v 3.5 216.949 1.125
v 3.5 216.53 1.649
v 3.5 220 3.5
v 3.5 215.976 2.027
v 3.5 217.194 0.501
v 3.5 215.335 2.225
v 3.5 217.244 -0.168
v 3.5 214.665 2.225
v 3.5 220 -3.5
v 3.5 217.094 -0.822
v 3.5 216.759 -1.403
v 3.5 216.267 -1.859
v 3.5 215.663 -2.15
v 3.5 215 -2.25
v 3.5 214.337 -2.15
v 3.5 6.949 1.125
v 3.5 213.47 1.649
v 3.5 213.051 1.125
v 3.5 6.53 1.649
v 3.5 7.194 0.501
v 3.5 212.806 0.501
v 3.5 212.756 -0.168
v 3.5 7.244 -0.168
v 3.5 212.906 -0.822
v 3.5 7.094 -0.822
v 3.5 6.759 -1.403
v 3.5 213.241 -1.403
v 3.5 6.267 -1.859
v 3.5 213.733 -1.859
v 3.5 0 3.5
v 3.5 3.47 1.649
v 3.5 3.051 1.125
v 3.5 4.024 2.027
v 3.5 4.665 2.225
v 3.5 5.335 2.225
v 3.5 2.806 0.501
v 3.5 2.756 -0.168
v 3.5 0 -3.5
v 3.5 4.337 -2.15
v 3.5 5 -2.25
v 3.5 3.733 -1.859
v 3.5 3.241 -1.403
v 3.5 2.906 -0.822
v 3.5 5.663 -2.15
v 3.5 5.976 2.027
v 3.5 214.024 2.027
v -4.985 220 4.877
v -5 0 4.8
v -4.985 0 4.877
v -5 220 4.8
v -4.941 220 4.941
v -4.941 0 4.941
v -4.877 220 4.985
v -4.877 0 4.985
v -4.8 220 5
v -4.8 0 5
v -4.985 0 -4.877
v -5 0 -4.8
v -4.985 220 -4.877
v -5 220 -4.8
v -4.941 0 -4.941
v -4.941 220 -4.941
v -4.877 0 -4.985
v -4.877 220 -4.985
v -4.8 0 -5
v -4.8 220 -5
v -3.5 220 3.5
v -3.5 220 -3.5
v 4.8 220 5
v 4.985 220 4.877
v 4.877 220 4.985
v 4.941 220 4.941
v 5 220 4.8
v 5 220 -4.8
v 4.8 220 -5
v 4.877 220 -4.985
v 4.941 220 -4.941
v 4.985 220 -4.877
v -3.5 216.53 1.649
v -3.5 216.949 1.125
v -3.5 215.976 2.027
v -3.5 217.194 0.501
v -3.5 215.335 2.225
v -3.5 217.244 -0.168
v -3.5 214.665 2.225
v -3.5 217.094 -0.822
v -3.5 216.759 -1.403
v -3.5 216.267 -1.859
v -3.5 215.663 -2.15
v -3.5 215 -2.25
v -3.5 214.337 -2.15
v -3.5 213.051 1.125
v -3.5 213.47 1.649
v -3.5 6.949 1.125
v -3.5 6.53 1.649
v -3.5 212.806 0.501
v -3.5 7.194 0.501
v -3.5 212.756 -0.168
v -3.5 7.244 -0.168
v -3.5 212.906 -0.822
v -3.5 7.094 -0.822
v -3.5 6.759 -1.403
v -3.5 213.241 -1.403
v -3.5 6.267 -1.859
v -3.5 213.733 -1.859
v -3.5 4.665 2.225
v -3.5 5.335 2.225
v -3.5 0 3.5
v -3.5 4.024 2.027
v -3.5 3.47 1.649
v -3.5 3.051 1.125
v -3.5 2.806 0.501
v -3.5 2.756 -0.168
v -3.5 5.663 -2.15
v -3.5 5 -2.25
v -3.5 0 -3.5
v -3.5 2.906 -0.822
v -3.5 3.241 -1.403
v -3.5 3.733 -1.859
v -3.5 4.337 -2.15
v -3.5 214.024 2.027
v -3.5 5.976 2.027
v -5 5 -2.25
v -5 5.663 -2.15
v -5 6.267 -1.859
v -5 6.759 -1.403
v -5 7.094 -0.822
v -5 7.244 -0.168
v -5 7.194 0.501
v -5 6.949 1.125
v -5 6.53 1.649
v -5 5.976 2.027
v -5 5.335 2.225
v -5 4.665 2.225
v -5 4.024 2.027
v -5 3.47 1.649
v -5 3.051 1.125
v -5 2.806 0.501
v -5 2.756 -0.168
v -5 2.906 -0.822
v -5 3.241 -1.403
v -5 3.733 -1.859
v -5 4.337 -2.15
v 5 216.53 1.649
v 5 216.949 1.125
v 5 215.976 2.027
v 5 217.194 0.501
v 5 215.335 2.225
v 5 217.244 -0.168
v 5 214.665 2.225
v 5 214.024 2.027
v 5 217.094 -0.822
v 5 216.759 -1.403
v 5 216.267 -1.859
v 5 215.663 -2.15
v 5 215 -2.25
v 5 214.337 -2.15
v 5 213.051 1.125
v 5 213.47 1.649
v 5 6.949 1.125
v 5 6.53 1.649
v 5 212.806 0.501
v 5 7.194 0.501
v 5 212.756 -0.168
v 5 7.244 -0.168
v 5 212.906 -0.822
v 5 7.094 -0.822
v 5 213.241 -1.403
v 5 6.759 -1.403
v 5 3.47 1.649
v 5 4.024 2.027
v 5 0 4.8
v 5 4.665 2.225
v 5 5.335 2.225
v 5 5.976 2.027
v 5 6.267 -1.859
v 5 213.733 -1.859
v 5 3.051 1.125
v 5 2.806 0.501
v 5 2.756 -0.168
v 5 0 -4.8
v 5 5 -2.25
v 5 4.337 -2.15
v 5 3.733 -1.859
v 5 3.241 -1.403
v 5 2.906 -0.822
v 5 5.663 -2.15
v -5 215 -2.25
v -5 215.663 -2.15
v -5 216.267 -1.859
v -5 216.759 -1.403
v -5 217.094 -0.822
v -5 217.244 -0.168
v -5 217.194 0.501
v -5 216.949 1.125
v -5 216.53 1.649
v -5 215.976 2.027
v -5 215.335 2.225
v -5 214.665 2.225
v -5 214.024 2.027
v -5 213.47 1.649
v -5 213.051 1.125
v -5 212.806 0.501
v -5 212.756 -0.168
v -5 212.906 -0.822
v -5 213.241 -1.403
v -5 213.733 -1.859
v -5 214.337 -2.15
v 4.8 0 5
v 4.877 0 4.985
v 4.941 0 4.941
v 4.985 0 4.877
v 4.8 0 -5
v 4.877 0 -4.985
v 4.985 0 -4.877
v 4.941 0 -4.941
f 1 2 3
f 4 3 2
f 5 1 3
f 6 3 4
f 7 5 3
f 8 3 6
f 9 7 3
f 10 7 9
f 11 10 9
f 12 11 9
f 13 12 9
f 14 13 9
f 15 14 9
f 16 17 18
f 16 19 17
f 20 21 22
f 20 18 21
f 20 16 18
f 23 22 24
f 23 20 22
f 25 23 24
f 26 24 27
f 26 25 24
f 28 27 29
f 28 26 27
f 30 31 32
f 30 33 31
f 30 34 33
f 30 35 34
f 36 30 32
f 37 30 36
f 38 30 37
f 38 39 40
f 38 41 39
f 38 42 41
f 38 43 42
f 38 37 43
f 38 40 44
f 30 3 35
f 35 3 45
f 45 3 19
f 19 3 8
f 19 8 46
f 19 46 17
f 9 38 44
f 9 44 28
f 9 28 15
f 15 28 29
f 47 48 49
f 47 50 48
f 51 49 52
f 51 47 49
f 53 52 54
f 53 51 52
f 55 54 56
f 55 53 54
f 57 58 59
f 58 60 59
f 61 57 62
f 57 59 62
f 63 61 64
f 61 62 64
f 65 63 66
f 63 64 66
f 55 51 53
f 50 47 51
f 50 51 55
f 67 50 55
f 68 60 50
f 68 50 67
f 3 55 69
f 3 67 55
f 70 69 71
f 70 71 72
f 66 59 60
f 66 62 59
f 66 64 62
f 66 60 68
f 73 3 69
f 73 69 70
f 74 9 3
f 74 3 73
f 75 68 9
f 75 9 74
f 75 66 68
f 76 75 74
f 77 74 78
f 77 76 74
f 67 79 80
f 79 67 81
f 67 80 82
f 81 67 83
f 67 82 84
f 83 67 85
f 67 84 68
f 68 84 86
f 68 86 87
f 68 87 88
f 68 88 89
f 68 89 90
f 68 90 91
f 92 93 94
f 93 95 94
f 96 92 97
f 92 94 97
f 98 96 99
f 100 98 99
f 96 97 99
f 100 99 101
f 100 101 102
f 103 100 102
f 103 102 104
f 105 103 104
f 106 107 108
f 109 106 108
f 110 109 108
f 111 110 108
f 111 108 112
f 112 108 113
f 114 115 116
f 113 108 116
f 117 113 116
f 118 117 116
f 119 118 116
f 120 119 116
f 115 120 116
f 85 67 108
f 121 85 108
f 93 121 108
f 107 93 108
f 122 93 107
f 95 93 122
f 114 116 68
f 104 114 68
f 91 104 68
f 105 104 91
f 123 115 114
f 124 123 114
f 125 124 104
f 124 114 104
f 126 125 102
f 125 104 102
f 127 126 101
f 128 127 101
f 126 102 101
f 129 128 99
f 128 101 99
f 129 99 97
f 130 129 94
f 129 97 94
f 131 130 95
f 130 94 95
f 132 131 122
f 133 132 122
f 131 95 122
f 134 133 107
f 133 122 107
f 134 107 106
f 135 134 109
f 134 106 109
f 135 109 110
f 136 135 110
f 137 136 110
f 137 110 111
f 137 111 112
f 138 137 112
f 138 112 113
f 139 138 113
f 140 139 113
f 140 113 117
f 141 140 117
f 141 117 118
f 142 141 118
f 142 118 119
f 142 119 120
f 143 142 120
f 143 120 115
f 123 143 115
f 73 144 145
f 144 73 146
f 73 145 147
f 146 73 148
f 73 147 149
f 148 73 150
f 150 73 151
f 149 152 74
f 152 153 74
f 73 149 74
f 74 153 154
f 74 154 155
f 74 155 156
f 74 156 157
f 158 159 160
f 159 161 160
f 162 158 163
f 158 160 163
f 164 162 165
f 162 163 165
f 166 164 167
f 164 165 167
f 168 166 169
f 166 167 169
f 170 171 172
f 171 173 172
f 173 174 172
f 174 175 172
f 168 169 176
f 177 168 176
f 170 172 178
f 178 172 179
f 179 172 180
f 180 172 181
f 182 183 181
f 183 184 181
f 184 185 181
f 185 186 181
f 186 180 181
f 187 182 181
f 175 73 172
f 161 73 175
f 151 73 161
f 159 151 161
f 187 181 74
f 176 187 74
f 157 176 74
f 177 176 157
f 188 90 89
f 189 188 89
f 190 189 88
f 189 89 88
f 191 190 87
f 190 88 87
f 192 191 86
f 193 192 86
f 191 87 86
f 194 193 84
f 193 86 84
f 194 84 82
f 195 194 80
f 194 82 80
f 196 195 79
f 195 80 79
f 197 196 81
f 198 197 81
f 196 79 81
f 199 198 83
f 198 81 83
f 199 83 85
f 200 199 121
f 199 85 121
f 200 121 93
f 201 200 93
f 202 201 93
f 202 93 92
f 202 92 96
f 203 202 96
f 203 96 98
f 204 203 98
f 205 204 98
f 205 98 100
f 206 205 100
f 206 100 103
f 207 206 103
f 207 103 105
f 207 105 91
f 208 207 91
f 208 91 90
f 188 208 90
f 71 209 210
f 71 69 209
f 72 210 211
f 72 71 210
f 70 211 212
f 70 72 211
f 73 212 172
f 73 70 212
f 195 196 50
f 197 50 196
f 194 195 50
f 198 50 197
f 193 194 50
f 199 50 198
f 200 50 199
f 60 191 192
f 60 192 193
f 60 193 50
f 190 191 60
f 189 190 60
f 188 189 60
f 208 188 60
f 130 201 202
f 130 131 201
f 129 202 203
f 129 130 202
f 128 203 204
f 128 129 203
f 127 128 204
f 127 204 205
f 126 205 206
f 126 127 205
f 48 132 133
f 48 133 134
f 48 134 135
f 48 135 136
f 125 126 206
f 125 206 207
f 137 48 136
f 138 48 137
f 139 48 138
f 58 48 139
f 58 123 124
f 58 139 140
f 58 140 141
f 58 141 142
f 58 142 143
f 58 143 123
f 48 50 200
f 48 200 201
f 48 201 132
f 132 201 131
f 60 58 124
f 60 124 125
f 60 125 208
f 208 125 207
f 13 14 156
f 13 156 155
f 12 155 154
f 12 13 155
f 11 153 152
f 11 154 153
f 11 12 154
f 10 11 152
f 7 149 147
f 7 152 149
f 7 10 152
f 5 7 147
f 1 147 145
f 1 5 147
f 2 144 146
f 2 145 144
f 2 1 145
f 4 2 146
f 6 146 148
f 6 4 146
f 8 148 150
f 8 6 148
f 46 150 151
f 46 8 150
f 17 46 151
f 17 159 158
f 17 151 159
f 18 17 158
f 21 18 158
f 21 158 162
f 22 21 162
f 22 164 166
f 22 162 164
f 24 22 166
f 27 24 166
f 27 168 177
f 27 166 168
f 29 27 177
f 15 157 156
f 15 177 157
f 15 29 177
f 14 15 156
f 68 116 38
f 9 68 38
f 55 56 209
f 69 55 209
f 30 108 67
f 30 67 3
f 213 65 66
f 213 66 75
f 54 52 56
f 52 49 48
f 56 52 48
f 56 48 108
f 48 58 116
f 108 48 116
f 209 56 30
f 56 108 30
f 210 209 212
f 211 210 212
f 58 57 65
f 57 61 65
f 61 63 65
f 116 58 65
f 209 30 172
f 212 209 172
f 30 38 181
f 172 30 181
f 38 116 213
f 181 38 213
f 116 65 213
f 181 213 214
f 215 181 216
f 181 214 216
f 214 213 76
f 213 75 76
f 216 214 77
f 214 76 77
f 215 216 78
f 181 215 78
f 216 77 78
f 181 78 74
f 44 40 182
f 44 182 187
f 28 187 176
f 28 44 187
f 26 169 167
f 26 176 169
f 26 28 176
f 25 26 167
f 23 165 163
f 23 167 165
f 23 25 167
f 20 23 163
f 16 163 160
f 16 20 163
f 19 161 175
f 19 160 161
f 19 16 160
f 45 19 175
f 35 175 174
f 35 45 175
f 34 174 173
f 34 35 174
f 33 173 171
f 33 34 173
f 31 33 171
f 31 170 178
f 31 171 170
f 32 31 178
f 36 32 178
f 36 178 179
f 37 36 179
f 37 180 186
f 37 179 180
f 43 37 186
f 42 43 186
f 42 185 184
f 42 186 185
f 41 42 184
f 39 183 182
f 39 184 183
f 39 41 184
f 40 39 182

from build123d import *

# Parameters (mm, degrees)
SKETCH1_W               = 10
SKETCH1_H               = 10
SKETCH1_W_2             = 7
SKETCH1_H_2             = 7
EXTRUDE_THIN1_DEPTH     = 220
SKETCH2_R               = 2.25
CUT_EXTRUDE1_DEPTH      = 6
CUT_EXTRUDE1_DEPTH_BACK = 6
FILLET1_R               = 0.2


with BuildPart() as part:
    # Sketch1 → Extrude-Thin1 (new body)
    with BuildSketch(Plane(origin=(0, 0, 0), x_dir=(1, 0, 0), z_dir=(0, 1, 0))):
        Rectangle(SKETCH1_W, SKETCH1_H)
        Rectangle(SKETCH1_W_2, SKETCH1_H_2, mode=Mode.SUBTRACT)
    extrude(amount=EXTRUDE_THIN1_DEPTH)

    # Sketch2 → Cut-Extrude1 (cut, two sides)
    with BuildSketch(Plane(origin=(0, 0, 0), x_dir=(0, 0, -1), z_dir=(1, 0, 0))) as cut_extrude1_sk:
        with Locations((0, 215)):
            Circle(SKETCH2_R)
        with Locations((0, 5)):
            Circle(SKETCH2_R)
    extrude(amount=CUT_EXTRUDE1_DEPTH, mode=Mode.SUBTRACT)
    extrude(cut_extrude1_sk.sketch, amount=-CUT_EXTRUDE1_DEPTH_BACK, mode=Mode.SUBTRACT)

    # Fillet1
    fillet1_edges = [part.edges().sort_by_distance(p)[0] for p in [
        (-5, 110, -5),
        (5, 110, -5),
        (5, 110, 5),
        (-5, 110, 5),
    ]]
    fillet(fillet1_edges, radius=FILLET1_R)


solid = part.part
